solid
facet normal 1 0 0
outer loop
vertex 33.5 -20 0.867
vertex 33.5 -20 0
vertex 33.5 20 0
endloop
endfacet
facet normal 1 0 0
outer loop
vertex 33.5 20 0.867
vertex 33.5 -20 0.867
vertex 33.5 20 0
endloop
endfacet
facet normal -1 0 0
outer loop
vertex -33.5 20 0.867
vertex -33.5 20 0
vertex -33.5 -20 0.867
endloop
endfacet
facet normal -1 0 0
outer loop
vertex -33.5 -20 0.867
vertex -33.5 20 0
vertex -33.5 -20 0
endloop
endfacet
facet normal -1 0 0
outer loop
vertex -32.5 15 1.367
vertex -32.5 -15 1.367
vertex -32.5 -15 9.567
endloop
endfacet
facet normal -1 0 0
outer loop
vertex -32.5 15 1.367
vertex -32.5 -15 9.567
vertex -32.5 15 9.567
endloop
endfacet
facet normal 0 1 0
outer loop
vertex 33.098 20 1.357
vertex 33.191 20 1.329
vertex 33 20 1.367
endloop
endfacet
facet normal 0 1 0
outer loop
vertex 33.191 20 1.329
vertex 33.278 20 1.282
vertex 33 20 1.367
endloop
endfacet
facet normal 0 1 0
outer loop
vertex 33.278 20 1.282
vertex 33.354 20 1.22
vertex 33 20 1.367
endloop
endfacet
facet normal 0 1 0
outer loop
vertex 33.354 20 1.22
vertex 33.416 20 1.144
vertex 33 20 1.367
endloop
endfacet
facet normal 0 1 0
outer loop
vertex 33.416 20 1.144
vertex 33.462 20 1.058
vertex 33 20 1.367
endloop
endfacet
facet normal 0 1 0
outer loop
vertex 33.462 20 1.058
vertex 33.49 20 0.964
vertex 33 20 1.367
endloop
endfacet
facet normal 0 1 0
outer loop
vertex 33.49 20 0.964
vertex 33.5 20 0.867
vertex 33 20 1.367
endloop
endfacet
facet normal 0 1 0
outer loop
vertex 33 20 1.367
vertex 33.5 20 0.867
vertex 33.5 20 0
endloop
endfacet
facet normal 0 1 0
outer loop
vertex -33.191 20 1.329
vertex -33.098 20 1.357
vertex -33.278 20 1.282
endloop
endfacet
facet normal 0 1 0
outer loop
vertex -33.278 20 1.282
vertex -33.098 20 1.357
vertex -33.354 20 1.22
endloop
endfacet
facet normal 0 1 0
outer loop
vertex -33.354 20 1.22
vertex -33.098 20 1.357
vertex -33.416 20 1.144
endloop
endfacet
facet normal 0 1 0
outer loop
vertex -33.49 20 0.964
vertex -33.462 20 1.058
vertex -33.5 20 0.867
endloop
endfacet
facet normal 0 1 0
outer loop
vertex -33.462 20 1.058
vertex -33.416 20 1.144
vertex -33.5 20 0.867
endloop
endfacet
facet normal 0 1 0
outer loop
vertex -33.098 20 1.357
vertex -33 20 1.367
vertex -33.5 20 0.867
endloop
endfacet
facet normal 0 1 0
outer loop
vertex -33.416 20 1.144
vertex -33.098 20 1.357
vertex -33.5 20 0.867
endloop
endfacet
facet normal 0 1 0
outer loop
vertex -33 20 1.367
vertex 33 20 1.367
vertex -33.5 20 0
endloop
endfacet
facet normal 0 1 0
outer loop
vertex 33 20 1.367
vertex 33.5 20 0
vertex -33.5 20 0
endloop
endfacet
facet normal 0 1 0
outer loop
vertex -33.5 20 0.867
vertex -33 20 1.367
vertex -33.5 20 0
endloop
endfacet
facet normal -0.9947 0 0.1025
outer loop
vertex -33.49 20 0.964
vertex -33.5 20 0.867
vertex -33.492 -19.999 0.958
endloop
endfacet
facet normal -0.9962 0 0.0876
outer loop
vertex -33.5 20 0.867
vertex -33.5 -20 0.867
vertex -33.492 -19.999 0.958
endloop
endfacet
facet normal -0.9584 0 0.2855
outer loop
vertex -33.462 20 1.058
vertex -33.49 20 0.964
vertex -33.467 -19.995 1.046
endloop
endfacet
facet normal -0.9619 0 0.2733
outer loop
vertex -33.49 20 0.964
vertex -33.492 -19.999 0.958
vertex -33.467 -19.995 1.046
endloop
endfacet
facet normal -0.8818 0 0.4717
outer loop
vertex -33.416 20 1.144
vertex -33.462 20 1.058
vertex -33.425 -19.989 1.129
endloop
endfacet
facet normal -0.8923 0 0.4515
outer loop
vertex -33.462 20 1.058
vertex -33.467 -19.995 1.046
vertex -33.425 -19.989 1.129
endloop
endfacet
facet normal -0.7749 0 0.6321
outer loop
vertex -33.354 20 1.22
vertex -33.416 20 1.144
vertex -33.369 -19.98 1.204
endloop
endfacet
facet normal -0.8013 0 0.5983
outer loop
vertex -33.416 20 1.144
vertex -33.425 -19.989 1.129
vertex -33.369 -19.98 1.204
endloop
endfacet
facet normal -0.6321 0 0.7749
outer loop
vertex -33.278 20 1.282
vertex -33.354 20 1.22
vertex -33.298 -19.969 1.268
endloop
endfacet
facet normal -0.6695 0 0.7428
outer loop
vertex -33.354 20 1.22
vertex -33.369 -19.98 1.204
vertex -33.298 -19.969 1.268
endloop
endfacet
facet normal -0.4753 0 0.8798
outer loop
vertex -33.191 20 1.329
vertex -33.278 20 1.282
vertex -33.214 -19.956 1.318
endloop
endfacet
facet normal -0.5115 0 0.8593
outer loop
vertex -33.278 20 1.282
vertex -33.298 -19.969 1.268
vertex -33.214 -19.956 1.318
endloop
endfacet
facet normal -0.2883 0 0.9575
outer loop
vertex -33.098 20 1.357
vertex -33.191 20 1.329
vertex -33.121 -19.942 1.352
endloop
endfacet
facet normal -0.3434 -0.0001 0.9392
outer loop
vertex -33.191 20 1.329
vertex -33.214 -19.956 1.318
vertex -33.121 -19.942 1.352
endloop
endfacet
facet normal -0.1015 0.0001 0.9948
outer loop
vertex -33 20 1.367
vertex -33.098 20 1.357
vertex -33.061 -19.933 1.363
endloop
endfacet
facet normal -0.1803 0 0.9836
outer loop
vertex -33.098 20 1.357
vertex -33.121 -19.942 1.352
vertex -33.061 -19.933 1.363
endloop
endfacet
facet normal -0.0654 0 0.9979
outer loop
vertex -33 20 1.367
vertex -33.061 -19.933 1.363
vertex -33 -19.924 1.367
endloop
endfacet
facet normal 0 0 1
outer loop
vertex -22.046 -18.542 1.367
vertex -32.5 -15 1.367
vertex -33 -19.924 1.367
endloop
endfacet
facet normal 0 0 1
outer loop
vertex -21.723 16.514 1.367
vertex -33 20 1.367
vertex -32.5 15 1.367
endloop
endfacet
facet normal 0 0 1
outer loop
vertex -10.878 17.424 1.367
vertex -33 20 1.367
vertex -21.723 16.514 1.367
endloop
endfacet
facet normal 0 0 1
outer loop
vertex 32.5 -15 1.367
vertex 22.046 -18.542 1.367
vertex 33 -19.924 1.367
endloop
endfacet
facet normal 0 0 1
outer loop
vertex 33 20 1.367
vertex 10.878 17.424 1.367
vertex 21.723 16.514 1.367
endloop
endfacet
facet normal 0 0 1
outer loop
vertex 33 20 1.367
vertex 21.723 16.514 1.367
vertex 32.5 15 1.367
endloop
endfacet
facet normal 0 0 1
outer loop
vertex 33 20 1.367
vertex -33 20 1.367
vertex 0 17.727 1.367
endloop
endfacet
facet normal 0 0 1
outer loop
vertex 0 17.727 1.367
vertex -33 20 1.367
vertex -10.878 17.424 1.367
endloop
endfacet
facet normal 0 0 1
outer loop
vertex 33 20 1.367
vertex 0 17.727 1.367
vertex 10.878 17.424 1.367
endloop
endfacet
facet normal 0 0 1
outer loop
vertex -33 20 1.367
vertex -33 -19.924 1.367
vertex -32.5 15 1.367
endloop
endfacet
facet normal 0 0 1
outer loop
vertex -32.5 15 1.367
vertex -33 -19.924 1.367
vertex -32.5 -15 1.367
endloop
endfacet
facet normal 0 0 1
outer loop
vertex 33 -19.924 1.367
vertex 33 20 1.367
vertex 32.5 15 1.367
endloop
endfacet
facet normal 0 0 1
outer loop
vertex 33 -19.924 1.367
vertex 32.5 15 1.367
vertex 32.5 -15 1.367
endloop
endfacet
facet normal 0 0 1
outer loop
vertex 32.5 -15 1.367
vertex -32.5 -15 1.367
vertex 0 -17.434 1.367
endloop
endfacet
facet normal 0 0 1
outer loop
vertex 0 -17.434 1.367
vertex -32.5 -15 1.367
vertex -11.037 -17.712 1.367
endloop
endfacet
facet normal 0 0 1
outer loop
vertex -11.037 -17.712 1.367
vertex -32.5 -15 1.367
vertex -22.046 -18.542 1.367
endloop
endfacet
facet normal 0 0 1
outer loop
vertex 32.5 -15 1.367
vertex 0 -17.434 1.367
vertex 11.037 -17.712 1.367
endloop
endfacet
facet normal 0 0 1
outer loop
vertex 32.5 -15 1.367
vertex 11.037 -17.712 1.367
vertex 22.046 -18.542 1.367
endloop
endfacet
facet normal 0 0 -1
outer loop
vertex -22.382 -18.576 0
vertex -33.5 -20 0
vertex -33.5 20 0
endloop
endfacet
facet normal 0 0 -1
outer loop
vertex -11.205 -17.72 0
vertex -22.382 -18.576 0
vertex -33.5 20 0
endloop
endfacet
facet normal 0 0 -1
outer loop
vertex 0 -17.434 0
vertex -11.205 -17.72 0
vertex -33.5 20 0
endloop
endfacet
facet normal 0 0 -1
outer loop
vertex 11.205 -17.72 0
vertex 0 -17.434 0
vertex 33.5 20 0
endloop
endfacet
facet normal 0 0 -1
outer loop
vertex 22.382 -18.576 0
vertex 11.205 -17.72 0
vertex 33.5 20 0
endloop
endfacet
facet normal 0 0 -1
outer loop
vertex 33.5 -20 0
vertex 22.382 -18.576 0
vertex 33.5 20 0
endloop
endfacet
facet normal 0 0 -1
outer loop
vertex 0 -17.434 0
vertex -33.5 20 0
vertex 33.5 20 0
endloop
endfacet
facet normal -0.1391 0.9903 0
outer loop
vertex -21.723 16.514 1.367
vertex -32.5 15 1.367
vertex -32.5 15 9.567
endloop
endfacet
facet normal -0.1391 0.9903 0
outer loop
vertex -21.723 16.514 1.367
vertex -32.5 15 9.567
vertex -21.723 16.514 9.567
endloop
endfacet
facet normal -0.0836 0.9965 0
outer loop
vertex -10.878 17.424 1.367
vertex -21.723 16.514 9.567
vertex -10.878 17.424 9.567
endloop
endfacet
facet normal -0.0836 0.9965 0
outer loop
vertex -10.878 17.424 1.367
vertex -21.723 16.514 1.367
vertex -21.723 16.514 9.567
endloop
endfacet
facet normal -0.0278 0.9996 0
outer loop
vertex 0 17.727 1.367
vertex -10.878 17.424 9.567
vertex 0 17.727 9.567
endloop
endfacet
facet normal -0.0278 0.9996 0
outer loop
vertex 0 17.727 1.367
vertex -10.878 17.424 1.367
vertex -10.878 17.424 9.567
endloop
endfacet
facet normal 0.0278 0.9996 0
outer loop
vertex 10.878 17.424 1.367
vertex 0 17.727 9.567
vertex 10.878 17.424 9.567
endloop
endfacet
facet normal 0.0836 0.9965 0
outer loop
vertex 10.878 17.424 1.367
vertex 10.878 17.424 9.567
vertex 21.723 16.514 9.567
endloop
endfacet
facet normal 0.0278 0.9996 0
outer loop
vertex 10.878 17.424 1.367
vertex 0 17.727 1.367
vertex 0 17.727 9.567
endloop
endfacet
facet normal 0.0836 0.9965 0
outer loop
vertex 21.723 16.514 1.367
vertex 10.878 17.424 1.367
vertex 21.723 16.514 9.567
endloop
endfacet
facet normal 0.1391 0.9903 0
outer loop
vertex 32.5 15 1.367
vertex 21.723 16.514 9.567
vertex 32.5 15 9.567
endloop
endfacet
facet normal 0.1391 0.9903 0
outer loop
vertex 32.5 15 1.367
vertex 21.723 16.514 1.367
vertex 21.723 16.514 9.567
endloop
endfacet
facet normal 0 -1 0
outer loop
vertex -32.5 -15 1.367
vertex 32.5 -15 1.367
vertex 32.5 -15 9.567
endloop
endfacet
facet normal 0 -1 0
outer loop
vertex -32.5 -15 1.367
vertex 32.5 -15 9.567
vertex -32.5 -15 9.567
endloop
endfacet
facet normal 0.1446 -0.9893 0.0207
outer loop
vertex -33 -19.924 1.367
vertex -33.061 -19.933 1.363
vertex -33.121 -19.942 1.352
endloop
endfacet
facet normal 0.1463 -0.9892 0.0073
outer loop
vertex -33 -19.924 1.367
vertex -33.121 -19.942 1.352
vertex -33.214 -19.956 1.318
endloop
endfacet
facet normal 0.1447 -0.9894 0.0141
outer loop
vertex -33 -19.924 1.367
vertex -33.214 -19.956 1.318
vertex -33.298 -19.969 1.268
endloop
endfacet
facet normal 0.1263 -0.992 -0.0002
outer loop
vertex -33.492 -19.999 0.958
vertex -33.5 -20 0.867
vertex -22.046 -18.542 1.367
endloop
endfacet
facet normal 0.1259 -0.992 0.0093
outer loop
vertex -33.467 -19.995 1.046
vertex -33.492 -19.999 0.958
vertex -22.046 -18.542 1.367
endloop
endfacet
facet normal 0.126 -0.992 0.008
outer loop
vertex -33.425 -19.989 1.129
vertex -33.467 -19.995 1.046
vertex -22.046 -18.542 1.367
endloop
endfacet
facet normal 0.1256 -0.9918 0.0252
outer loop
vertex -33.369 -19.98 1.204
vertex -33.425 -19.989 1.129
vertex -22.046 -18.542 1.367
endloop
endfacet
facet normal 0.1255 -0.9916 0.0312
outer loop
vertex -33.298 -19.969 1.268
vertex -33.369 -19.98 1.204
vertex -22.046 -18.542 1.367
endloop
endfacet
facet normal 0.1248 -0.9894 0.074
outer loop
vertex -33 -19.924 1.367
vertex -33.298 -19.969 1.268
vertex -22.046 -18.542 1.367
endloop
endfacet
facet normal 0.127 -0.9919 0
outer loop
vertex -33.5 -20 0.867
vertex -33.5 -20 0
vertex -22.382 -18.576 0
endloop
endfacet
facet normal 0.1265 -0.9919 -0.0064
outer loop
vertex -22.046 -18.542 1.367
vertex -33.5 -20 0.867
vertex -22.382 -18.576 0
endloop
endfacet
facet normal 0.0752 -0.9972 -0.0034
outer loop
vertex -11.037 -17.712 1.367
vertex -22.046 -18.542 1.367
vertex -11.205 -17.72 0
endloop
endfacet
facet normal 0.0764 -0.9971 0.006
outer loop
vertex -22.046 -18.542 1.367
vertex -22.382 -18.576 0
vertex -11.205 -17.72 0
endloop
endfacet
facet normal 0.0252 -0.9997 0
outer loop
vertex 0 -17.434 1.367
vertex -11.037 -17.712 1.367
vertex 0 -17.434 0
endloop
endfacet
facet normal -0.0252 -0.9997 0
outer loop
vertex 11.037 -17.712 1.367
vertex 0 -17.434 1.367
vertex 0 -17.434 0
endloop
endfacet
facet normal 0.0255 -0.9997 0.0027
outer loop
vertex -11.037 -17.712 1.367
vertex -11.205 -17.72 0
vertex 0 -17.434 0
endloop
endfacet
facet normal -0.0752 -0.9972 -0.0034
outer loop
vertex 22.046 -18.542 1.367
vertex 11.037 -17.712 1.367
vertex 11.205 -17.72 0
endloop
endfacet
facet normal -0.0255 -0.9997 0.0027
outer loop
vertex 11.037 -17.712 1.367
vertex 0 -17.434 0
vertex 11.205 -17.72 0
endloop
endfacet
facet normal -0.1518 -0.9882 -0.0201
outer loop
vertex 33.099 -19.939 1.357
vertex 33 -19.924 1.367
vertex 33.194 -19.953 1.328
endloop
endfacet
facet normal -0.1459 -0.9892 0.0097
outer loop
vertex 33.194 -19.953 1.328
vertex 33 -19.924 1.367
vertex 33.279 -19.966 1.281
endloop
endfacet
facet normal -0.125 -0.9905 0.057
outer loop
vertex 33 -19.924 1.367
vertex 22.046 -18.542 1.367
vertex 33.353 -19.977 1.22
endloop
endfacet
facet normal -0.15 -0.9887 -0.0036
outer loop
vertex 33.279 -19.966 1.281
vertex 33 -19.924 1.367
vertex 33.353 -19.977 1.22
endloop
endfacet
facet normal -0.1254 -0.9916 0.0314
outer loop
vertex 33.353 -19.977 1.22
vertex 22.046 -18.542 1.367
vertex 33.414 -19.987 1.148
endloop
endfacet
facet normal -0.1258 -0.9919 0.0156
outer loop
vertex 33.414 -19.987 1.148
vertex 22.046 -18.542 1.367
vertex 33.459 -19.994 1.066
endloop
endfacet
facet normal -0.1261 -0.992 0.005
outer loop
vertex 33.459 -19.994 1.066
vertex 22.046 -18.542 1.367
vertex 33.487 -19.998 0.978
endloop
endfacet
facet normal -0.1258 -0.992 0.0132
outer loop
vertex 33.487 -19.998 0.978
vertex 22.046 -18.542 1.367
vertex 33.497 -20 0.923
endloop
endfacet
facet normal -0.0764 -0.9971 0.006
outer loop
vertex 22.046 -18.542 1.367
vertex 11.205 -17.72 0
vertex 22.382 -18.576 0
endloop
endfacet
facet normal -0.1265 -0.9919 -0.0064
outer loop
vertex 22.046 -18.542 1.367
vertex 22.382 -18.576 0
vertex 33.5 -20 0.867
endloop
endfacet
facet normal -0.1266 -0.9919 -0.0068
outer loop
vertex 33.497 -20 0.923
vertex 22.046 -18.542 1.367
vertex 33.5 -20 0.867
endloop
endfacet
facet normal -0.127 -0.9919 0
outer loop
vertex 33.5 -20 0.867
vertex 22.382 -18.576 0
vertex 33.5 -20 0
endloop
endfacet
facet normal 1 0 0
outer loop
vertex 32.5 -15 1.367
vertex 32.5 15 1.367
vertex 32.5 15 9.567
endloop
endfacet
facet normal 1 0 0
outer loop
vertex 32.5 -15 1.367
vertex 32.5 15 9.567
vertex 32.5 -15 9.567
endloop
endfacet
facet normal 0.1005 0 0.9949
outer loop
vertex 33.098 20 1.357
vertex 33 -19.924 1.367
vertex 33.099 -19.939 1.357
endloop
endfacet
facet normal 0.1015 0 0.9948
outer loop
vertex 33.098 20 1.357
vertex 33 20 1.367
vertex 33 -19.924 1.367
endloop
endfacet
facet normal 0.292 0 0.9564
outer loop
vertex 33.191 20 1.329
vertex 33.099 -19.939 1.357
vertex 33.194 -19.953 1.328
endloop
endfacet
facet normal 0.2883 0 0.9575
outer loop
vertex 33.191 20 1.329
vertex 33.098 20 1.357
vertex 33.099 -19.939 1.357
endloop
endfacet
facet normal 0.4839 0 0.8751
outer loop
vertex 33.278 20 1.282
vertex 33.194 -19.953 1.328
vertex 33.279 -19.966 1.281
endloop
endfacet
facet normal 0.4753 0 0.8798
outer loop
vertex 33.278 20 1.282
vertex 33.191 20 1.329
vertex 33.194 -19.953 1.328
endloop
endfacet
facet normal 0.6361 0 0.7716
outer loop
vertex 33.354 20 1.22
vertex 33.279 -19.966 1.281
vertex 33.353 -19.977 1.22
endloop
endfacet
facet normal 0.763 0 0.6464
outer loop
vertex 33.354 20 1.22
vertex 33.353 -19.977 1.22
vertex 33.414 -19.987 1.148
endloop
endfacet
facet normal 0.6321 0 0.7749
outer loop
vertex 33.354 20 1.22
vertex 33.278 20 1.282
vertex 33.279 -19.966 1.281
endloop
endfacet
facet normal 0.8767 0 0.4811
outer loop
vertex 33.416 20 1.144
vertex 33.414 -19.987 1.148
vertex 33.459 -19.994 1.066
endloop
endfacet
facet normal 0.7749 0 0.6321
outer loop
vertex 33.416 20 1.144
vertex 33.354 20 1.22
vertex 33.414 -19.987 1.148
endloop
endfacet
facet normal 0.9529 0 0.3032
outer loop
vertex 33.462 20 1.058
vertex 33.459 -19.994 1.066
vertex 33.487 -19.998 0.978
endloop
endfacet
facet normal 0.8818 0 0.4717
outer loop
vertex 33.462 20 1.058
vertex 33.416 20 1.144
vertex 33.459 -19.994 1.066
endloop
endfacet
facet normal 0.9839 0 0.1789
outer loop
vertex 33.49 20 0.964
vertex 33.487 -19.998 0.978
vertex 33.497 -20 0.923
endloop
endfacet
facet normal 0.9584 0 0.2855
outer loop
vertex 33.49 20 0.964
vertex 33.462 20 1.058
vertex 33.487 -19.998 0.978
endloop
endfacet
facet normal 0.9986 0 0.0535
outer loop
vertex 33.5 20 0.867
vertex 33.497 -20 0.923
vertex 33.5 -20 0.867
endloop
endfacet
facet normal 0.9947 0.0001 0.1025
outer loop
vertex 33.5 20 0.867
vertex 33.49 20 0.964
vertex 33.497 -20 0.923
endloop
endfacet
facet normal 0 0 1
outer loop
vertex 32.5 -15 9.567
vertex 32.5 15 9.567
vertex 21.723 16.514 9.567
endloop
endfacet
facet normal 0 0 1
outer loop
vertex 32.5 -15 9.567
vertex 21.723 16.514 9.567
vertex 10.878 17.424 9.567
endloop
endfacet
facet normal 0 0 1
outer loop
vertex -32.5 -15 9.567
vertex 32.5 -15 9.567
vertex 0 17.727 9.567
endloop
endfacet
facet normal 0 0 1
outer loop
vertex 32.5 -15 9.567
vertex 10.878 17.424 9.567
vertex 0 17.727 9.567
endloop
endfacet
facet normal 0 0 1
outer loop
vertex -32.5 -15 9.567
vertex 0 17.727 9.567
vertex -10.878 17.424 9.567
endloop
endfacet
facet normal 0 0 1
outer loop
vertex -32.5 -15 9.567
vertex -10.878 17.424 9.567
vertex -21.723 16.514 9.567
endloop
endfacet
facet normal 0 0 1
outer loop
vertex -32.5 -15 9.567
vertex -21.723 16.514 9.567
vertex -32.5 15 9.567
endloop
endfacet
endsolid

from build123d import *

# Parameters (mm, degrees)
BOSS_EXTRUDE1_DEPTH = 1.366666667
BOSS_EXTRUDE2_DEPTH = 8.2
FILLET1_R           = 0.5


with BuildPart() as part:
    # Sketch1 → Boss-Extrude1 (new body)
    with BuildSketch(Plane.XY):
        with BuildLine():
            Line((-33.5, 20), (-33.5, -20))
            ThreePointArc((-33.5, -20), (0, -17.434472888), (33.5, -20))
            Line((33.5, -20), (33.5, 20))
            Line((33.5, 20), (-33.5, 20))
        make_face()
    extrude(amount=BOSS_EXTRUDE1_DEPTH)

    # Sketch2 → Boss-Extrude2 (add)
    with BuildSketch(Plane.XY.offset(1.366666667)):
        with BuildLine():
            Line((32.5, -15), (-32.5, -15))
            Line((-32.5, -15), (-32.5, 15))
            ThreePointArc((-32.5, 15), (0, 17.727407049), (32.5, 15))
            Line((32.5, 15), (32.5, -15))
        make_face()
    extrude(amount=BOSS_EXTRUDE2_DEPTH)

    # Fillet1
    fillet1_edges = [part.edges().sort_by_distance(p)[0] for p in [
        (33.5, 0, 1.366666667),
        (-33.5, 0, 1.366666667),
    ]]
    fillet(fillet1_edges, radius=FILLET1_R)


solid = part.part
